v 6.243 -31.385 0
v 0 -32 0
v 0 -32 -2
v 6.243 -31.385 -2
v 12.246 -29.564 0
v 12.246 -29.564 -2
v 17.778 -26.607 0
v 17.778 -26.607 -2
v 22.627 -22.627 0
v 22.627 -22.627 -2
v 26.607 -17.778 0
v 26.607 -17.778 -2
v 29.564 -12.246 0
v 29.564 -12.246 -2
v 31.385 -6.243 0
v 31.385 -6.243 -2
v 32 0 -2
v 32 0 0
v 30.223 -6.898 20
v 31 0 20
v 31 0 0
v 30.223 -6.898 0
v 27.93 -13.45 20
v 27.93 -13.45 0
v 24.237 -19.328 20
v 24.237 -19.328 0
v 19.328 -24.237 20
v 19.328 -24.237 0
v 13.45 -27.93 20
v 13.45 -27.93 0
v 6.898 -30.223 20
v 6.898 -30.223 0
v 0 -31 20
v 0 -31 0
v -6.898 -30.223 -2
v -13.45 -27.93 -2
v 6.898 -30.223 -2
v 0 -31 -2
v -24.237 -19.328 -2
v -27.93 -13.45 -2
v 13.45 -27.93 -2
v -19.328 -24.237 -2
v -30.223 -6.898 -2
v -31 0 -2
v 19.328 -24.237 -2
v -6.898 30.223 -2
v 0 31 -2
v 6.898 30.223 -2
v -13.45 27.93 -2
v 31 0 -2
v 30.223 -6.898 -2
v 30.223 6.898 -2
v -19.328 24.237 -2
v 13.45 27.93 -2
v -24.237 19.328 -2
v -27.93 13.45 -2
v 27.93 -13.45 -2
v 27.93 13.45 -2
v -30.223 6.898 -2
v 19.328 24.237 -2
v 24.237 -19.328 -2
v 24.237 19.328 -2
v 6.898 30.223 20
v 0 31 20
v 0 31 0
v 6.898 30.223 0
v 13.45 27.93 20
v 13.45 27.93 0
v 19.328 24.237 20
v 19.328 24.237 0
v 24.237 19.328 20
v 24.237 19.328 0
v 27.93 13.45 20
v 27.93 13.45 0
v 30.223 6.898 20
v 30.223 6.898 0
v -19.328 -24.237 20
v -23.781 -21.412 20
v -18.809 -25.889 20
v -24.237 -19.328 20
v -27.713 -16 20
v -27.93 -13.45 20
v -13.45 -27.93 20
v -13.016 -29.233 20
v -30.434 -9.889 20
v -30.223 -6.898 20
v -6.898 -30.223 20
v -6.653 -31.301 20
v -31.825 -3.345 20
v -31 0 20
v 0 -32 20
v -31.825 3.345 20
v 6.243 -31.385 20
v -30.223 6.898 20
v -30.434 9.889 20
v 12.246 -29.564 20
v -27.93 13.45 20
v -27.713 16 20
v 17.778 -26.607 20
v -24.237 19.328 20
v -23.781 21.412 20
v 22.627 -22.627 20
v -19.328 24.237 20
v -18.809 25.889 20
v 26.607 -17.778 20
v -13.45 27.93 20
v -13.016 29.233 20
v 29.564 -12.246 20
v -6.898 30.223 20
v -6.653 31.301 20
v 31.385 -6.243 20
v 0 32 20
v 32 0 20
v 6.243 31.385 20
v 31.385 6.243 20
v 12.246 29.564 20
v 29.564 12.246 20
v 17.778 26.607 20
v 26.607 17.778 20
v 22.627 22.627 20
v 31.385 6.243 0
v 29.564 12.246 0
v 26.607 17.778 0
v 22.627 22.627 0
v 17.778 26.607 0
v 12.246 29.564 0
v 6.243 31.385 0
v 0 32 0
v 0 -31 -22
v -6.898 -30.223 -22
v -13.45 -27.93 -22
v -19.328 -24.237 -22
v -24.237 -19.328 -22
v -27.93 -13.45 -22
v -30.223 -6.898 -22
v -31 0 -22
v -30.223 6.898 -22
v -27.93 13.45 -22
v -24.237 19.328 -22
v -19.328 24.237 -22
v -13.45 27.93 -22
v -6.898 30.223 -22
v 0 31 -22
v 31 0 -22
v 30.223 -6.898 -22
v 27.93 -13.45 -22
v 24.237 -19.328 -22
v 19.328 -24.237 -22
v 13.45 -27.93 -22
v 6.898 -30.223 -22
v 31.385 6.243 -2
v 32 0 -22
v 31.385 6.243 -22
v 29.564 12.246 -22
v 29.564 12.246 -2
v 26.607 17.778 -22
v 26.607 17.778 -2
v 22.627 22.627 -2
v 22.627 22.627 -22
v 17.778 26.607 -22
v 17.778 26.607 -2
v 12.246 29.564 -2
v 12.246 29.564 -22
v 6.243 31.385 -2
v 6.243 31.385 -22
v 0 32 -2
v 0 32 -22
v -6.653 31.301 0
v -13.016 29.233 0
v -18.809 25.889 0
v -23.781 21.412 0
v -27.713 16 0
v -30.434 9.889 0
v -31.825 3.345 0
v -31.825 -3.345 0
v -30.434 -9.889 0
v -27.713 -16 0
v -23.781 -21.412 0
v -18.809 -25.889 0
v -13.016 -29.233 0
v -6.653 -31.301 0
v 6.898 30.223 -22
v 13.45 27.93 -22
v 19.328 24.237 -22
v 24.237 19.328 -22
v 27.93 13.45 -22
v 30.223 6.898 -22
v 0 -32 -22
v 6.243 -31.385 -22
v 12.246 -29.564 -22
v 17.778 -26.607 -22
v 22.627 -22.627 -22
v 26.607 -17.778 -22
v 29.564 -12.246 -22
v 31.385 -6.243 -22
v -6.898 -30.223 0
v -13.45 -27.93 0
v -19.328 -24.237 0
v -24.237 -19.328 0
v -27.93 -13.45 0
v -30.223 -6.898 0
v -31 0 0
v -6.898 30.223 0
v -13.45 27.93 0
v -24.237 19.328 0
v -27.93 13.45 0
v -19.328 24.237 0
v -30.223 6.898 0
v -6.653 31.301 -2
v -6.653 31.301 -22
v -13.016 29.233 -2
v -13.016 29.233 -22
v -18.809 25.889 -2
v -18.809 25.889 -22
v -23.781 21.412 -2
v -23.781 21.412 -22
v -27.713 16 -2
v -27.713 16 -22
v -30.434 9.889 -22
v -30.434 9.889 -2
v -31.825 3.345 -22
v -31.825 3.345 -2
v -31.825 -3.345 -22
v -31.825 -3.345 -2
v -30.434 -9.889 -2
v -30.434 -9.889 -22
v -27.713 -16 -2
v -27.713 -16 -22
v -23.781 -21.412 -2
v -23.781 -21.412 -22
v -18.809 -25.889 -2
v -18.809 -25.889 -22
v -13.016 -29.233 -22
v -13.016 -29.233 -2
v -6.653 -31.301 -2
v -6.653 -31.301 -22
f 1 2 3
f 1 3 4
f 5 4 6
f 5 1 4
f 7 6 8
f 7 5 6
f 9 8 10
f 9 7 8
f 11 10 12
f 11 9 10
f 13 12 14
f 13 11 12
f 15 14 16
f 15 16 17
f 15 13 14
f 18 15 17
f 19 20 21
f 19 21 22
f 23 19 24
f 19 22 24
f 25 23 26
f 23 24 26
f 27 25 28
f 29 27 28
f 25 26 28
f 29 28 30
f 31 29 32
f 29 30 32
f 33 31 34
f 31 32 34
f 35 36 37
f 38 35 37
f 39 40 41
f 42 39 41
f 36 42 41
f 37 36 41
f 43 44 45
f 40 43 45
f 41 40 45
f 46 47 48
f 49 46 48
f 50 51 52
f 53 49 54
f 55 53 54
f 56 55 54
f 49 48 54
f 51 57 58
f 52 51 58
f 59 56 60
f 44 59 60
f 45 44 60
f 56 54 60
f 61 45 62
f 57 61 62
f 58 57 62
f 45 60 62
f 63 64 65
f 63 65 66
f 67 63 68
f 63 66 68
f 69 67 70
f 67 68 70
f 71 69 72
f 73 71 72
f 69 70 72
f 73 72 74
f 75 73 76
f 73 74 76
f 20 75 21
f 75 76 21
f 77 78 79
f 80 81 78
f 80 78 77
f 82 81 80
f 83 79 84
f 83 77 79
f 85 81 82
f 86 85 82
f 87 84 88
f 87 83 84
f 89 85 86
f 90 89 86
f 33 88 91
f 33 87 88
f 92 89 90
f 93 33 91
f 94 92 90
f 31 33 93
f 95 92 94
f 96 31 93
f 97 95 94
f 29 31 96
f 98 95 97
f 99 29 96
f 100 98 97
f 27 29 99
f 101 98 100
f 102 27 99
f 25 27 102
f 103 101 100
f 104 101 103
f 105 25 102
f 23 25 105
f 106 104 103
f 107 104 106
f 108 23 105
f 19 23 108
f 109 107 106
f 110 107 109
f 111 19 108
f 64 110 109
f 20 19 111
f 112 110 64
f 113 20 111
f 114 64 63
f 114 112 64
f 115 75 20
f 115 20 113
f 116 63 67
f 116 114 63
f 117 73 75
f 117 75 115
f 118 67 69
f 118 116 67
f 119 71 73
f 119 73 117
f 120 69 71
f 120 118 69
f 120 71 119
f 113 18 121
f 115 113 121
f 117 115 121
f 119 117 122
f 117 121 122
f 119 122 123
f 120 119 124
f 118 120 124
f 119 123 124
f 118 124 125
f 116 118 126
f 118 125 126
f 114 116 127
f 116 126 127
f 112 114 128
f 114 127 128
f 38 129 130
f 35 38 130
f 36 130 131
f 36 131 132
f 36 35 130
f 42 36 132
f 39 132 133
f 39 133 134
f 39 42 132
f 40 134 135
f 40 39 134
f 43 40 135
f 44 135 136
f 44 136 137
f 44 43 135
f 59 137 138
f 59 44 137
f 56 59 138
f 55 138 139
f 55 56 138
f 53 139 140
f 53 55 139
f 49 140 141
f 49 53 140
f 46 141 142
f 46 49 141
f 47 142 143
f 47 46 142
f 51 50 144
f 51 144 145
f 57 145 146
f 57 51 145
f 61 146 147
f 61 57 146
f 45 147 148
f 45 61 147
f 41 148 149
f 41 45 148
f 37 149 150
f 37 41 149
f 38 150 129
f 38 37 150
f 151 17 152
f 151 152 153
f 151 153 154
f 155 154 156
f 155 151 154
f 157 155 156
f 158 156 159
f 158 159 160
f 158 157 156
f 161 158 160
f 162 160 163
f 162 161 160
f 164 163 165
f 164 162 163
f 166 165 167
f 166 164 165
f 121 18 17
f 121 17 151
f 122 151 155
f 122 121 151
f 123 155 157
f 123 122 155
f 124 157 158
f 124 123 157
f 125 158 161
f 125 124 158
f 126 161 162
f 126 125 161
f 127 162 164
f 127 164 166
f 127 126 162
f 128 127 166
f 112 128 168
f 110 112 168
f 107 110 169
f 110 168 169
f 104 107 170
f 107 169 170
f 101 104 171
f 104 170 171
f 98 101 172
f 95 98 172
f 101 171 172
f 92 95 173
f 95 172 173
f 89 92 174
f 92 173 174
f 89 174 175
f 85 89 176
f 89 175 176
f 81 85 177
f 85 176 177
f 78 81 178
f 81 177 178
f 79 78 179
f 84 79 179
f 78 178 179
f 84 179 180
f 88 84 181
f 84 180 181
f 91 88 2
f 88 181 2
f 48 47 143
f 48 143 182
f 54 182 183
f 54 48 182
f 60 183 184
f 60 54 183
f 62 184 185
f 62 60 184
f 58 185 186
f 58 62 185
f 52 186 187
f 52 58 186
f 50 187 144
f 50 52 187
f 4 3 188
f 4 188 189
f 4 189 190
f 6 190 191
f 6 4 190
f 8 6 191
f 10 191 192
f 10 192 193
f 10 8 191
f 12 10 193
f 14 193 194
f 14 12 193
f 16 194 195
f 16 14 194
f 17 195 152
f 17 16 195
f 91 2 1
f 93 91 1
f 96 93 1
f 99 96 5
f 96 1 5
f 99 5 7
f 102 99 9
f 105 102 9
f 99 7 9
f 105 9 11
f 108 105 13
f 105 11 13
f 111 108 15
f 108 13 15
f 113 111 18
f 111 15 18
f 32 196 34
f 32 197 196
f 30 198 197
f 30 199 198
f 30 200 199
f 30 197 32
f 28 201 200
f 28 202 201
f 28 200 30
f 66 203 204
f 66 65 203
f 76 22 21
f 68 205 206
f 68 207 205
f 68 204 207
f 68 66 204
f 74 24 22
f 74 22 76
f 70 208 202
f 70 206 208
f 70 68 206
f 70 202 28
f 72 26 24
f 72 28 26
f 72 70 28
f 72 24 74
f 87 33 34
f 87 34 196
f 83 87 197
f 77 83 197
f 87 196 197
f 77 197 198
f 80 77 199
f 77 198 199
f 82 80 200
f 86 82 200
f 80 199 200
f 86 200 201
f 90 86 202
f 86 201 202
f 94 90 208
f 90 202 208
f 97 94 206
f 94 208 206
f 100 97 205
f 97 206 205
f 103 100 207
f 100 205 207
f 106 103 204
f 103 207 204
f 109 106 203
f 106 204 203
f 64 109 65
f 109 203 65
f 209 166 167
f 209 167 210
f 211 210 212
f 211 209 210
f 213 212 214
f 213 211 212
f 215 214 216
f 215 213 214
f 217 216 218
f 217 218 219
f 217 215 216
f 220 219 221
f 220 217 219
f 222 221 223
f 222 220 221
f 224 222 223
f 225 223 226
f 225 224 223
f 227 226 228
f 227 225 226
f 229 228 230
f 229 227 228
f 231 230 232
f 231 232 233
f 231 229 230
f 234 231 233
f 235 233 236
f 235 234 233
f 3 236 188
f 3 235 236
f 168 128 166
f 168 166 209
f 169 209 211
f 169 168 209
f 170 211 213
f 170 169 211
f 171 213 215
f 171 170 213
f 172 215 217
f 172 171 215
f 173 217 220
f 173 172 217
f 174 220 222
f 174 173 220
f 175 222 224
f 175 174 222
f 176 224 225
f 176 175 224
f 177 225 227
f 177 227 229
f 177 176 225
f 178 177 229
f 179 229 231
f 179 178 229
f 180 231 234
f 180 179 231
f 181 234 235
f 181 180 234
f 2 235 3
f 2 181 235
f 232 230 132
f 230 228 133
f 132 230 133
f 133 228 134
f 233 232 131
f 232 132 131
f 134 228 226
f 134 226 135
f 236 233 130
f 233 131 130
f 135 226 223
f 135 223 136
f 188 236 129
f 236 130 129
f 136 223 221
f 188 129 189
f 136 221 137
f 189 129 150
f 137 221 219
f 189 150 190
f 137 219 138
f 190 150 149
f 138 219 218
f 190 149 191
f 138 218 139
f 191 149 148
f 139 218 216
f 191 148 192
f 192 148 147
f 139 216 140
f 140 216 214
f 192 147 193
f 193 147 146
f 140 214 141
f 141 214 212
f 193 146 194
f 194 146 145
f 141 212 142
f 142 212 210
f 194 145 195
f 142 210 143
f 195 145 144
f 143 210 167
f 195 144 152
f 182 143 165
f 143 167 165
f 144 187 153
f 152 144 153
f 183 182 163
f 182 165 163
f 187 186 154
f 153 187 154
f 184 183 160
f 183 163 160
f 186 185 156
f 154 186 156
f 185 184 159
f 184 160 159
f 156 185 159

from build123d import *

# Parameters (mm, degrees)
F1_DEPTH = 20
F2_DEPTH = 22
F3_DEPTH = 2


with BuildPart() as f1:
    # F0 (on Top) → F1 (new body)
    with BuildSketch(Plane.XY):
        with BuildLine():
            ThreePointArc((0, -32), (22.627417, -22.627417), (32, 0))
            ThreePointArc((32, 0), (22.627417, 22.627417), (0, 32))
            Line((0, 32), (0, 31))
            ThreePointArc((0, 31), (21.92031, 21.92031), (31, 0))
            ThreePointArc((31, 0), (21.92031, -21.92031), (0, -31))
            Line((0, -31), (0, -32))
        make_face()
        with BuildLine():
            Line((0, 31), (0, 32))
            ThreePointArc((0, 32), (-32, 0), (0, -32))
            Line((0, -32), (0, -31))
            ThreePointArc((0, -31), (-31, 0), (0, 31))
        make_face()
    extrude(amount=F1_DEPTH)

    # F0 (on Top) → F2 (join)
    with BuildSketch(Plane.XY):
        with BuildLine():
            ThreePointArc((0, -32), (22.627417, -22.627417), (32, 0))
            ThreePointArc((32, 0), (22.627417, 22.627417), (0, 32))
            Line((0, 32), (0, 31))
            ThreePointArc((0, 31), (21.92031, 21.92031), (31, 0))
            ThreePointArc((31, 0), (21.92031, -21.92031), (0, -31))
            Line((0, -31), (0, -32))
        make_face()
        with BuildLine():
            Line((0, 31), (0, 32))
            ThreePointArc((0, 32), (-32, 0), (0, -32))
            Line((0, -32), (0, -31))
            ThreePointArc((0, -31), (-31, 0), (0, 31))
        make_face()
    extrude(amount=-F2_DEPTH)

    # F0 (on Top) → F3 (join)
    with BuildSketch(Plane.XY):
        with BuildLine():
            ThreePointArc((31, 0), (21.92031, 21.92031), (0, 31))
            Line((0, 31), (0, -31))
            ThreePointArc((0, -31), (21.92031, -21.92031), (31, 0))
        make_face()
        with BuildLine():
            Line((0, -31), (0, 31))
            ThreePointArc((0, 31), (-31, 0), (0, -31))
        make_face()
        with BuildLine():
            Line((0, 31), (0, 32))
            ThreePointArc((0, 32), (-32, 0), (0, -32))
            Line((0, -32), (0, -31))
            ThreePointArc((0, -31), (-31, 0), (0, 31))
        make_face()
        with BuildLine():
            ThreePointArc((0, -32), (22.627417, -22.627417), (32, 0))
            ThreePointArc((32, 0), (22.627417, 22.627417), (0, 32))
            Line((0, 32), (0, 31))
            ThreePointArc((0, 31), (21.92031, 21.92031), (31, 0))
            ThreePointArc((31, 0), (21.92031, -21.92031), (0, -31))
            Line((0, -31), (0, -32))
        make_face()
    extrude(amount=-F3_DEPTH)


solid = f1.part
